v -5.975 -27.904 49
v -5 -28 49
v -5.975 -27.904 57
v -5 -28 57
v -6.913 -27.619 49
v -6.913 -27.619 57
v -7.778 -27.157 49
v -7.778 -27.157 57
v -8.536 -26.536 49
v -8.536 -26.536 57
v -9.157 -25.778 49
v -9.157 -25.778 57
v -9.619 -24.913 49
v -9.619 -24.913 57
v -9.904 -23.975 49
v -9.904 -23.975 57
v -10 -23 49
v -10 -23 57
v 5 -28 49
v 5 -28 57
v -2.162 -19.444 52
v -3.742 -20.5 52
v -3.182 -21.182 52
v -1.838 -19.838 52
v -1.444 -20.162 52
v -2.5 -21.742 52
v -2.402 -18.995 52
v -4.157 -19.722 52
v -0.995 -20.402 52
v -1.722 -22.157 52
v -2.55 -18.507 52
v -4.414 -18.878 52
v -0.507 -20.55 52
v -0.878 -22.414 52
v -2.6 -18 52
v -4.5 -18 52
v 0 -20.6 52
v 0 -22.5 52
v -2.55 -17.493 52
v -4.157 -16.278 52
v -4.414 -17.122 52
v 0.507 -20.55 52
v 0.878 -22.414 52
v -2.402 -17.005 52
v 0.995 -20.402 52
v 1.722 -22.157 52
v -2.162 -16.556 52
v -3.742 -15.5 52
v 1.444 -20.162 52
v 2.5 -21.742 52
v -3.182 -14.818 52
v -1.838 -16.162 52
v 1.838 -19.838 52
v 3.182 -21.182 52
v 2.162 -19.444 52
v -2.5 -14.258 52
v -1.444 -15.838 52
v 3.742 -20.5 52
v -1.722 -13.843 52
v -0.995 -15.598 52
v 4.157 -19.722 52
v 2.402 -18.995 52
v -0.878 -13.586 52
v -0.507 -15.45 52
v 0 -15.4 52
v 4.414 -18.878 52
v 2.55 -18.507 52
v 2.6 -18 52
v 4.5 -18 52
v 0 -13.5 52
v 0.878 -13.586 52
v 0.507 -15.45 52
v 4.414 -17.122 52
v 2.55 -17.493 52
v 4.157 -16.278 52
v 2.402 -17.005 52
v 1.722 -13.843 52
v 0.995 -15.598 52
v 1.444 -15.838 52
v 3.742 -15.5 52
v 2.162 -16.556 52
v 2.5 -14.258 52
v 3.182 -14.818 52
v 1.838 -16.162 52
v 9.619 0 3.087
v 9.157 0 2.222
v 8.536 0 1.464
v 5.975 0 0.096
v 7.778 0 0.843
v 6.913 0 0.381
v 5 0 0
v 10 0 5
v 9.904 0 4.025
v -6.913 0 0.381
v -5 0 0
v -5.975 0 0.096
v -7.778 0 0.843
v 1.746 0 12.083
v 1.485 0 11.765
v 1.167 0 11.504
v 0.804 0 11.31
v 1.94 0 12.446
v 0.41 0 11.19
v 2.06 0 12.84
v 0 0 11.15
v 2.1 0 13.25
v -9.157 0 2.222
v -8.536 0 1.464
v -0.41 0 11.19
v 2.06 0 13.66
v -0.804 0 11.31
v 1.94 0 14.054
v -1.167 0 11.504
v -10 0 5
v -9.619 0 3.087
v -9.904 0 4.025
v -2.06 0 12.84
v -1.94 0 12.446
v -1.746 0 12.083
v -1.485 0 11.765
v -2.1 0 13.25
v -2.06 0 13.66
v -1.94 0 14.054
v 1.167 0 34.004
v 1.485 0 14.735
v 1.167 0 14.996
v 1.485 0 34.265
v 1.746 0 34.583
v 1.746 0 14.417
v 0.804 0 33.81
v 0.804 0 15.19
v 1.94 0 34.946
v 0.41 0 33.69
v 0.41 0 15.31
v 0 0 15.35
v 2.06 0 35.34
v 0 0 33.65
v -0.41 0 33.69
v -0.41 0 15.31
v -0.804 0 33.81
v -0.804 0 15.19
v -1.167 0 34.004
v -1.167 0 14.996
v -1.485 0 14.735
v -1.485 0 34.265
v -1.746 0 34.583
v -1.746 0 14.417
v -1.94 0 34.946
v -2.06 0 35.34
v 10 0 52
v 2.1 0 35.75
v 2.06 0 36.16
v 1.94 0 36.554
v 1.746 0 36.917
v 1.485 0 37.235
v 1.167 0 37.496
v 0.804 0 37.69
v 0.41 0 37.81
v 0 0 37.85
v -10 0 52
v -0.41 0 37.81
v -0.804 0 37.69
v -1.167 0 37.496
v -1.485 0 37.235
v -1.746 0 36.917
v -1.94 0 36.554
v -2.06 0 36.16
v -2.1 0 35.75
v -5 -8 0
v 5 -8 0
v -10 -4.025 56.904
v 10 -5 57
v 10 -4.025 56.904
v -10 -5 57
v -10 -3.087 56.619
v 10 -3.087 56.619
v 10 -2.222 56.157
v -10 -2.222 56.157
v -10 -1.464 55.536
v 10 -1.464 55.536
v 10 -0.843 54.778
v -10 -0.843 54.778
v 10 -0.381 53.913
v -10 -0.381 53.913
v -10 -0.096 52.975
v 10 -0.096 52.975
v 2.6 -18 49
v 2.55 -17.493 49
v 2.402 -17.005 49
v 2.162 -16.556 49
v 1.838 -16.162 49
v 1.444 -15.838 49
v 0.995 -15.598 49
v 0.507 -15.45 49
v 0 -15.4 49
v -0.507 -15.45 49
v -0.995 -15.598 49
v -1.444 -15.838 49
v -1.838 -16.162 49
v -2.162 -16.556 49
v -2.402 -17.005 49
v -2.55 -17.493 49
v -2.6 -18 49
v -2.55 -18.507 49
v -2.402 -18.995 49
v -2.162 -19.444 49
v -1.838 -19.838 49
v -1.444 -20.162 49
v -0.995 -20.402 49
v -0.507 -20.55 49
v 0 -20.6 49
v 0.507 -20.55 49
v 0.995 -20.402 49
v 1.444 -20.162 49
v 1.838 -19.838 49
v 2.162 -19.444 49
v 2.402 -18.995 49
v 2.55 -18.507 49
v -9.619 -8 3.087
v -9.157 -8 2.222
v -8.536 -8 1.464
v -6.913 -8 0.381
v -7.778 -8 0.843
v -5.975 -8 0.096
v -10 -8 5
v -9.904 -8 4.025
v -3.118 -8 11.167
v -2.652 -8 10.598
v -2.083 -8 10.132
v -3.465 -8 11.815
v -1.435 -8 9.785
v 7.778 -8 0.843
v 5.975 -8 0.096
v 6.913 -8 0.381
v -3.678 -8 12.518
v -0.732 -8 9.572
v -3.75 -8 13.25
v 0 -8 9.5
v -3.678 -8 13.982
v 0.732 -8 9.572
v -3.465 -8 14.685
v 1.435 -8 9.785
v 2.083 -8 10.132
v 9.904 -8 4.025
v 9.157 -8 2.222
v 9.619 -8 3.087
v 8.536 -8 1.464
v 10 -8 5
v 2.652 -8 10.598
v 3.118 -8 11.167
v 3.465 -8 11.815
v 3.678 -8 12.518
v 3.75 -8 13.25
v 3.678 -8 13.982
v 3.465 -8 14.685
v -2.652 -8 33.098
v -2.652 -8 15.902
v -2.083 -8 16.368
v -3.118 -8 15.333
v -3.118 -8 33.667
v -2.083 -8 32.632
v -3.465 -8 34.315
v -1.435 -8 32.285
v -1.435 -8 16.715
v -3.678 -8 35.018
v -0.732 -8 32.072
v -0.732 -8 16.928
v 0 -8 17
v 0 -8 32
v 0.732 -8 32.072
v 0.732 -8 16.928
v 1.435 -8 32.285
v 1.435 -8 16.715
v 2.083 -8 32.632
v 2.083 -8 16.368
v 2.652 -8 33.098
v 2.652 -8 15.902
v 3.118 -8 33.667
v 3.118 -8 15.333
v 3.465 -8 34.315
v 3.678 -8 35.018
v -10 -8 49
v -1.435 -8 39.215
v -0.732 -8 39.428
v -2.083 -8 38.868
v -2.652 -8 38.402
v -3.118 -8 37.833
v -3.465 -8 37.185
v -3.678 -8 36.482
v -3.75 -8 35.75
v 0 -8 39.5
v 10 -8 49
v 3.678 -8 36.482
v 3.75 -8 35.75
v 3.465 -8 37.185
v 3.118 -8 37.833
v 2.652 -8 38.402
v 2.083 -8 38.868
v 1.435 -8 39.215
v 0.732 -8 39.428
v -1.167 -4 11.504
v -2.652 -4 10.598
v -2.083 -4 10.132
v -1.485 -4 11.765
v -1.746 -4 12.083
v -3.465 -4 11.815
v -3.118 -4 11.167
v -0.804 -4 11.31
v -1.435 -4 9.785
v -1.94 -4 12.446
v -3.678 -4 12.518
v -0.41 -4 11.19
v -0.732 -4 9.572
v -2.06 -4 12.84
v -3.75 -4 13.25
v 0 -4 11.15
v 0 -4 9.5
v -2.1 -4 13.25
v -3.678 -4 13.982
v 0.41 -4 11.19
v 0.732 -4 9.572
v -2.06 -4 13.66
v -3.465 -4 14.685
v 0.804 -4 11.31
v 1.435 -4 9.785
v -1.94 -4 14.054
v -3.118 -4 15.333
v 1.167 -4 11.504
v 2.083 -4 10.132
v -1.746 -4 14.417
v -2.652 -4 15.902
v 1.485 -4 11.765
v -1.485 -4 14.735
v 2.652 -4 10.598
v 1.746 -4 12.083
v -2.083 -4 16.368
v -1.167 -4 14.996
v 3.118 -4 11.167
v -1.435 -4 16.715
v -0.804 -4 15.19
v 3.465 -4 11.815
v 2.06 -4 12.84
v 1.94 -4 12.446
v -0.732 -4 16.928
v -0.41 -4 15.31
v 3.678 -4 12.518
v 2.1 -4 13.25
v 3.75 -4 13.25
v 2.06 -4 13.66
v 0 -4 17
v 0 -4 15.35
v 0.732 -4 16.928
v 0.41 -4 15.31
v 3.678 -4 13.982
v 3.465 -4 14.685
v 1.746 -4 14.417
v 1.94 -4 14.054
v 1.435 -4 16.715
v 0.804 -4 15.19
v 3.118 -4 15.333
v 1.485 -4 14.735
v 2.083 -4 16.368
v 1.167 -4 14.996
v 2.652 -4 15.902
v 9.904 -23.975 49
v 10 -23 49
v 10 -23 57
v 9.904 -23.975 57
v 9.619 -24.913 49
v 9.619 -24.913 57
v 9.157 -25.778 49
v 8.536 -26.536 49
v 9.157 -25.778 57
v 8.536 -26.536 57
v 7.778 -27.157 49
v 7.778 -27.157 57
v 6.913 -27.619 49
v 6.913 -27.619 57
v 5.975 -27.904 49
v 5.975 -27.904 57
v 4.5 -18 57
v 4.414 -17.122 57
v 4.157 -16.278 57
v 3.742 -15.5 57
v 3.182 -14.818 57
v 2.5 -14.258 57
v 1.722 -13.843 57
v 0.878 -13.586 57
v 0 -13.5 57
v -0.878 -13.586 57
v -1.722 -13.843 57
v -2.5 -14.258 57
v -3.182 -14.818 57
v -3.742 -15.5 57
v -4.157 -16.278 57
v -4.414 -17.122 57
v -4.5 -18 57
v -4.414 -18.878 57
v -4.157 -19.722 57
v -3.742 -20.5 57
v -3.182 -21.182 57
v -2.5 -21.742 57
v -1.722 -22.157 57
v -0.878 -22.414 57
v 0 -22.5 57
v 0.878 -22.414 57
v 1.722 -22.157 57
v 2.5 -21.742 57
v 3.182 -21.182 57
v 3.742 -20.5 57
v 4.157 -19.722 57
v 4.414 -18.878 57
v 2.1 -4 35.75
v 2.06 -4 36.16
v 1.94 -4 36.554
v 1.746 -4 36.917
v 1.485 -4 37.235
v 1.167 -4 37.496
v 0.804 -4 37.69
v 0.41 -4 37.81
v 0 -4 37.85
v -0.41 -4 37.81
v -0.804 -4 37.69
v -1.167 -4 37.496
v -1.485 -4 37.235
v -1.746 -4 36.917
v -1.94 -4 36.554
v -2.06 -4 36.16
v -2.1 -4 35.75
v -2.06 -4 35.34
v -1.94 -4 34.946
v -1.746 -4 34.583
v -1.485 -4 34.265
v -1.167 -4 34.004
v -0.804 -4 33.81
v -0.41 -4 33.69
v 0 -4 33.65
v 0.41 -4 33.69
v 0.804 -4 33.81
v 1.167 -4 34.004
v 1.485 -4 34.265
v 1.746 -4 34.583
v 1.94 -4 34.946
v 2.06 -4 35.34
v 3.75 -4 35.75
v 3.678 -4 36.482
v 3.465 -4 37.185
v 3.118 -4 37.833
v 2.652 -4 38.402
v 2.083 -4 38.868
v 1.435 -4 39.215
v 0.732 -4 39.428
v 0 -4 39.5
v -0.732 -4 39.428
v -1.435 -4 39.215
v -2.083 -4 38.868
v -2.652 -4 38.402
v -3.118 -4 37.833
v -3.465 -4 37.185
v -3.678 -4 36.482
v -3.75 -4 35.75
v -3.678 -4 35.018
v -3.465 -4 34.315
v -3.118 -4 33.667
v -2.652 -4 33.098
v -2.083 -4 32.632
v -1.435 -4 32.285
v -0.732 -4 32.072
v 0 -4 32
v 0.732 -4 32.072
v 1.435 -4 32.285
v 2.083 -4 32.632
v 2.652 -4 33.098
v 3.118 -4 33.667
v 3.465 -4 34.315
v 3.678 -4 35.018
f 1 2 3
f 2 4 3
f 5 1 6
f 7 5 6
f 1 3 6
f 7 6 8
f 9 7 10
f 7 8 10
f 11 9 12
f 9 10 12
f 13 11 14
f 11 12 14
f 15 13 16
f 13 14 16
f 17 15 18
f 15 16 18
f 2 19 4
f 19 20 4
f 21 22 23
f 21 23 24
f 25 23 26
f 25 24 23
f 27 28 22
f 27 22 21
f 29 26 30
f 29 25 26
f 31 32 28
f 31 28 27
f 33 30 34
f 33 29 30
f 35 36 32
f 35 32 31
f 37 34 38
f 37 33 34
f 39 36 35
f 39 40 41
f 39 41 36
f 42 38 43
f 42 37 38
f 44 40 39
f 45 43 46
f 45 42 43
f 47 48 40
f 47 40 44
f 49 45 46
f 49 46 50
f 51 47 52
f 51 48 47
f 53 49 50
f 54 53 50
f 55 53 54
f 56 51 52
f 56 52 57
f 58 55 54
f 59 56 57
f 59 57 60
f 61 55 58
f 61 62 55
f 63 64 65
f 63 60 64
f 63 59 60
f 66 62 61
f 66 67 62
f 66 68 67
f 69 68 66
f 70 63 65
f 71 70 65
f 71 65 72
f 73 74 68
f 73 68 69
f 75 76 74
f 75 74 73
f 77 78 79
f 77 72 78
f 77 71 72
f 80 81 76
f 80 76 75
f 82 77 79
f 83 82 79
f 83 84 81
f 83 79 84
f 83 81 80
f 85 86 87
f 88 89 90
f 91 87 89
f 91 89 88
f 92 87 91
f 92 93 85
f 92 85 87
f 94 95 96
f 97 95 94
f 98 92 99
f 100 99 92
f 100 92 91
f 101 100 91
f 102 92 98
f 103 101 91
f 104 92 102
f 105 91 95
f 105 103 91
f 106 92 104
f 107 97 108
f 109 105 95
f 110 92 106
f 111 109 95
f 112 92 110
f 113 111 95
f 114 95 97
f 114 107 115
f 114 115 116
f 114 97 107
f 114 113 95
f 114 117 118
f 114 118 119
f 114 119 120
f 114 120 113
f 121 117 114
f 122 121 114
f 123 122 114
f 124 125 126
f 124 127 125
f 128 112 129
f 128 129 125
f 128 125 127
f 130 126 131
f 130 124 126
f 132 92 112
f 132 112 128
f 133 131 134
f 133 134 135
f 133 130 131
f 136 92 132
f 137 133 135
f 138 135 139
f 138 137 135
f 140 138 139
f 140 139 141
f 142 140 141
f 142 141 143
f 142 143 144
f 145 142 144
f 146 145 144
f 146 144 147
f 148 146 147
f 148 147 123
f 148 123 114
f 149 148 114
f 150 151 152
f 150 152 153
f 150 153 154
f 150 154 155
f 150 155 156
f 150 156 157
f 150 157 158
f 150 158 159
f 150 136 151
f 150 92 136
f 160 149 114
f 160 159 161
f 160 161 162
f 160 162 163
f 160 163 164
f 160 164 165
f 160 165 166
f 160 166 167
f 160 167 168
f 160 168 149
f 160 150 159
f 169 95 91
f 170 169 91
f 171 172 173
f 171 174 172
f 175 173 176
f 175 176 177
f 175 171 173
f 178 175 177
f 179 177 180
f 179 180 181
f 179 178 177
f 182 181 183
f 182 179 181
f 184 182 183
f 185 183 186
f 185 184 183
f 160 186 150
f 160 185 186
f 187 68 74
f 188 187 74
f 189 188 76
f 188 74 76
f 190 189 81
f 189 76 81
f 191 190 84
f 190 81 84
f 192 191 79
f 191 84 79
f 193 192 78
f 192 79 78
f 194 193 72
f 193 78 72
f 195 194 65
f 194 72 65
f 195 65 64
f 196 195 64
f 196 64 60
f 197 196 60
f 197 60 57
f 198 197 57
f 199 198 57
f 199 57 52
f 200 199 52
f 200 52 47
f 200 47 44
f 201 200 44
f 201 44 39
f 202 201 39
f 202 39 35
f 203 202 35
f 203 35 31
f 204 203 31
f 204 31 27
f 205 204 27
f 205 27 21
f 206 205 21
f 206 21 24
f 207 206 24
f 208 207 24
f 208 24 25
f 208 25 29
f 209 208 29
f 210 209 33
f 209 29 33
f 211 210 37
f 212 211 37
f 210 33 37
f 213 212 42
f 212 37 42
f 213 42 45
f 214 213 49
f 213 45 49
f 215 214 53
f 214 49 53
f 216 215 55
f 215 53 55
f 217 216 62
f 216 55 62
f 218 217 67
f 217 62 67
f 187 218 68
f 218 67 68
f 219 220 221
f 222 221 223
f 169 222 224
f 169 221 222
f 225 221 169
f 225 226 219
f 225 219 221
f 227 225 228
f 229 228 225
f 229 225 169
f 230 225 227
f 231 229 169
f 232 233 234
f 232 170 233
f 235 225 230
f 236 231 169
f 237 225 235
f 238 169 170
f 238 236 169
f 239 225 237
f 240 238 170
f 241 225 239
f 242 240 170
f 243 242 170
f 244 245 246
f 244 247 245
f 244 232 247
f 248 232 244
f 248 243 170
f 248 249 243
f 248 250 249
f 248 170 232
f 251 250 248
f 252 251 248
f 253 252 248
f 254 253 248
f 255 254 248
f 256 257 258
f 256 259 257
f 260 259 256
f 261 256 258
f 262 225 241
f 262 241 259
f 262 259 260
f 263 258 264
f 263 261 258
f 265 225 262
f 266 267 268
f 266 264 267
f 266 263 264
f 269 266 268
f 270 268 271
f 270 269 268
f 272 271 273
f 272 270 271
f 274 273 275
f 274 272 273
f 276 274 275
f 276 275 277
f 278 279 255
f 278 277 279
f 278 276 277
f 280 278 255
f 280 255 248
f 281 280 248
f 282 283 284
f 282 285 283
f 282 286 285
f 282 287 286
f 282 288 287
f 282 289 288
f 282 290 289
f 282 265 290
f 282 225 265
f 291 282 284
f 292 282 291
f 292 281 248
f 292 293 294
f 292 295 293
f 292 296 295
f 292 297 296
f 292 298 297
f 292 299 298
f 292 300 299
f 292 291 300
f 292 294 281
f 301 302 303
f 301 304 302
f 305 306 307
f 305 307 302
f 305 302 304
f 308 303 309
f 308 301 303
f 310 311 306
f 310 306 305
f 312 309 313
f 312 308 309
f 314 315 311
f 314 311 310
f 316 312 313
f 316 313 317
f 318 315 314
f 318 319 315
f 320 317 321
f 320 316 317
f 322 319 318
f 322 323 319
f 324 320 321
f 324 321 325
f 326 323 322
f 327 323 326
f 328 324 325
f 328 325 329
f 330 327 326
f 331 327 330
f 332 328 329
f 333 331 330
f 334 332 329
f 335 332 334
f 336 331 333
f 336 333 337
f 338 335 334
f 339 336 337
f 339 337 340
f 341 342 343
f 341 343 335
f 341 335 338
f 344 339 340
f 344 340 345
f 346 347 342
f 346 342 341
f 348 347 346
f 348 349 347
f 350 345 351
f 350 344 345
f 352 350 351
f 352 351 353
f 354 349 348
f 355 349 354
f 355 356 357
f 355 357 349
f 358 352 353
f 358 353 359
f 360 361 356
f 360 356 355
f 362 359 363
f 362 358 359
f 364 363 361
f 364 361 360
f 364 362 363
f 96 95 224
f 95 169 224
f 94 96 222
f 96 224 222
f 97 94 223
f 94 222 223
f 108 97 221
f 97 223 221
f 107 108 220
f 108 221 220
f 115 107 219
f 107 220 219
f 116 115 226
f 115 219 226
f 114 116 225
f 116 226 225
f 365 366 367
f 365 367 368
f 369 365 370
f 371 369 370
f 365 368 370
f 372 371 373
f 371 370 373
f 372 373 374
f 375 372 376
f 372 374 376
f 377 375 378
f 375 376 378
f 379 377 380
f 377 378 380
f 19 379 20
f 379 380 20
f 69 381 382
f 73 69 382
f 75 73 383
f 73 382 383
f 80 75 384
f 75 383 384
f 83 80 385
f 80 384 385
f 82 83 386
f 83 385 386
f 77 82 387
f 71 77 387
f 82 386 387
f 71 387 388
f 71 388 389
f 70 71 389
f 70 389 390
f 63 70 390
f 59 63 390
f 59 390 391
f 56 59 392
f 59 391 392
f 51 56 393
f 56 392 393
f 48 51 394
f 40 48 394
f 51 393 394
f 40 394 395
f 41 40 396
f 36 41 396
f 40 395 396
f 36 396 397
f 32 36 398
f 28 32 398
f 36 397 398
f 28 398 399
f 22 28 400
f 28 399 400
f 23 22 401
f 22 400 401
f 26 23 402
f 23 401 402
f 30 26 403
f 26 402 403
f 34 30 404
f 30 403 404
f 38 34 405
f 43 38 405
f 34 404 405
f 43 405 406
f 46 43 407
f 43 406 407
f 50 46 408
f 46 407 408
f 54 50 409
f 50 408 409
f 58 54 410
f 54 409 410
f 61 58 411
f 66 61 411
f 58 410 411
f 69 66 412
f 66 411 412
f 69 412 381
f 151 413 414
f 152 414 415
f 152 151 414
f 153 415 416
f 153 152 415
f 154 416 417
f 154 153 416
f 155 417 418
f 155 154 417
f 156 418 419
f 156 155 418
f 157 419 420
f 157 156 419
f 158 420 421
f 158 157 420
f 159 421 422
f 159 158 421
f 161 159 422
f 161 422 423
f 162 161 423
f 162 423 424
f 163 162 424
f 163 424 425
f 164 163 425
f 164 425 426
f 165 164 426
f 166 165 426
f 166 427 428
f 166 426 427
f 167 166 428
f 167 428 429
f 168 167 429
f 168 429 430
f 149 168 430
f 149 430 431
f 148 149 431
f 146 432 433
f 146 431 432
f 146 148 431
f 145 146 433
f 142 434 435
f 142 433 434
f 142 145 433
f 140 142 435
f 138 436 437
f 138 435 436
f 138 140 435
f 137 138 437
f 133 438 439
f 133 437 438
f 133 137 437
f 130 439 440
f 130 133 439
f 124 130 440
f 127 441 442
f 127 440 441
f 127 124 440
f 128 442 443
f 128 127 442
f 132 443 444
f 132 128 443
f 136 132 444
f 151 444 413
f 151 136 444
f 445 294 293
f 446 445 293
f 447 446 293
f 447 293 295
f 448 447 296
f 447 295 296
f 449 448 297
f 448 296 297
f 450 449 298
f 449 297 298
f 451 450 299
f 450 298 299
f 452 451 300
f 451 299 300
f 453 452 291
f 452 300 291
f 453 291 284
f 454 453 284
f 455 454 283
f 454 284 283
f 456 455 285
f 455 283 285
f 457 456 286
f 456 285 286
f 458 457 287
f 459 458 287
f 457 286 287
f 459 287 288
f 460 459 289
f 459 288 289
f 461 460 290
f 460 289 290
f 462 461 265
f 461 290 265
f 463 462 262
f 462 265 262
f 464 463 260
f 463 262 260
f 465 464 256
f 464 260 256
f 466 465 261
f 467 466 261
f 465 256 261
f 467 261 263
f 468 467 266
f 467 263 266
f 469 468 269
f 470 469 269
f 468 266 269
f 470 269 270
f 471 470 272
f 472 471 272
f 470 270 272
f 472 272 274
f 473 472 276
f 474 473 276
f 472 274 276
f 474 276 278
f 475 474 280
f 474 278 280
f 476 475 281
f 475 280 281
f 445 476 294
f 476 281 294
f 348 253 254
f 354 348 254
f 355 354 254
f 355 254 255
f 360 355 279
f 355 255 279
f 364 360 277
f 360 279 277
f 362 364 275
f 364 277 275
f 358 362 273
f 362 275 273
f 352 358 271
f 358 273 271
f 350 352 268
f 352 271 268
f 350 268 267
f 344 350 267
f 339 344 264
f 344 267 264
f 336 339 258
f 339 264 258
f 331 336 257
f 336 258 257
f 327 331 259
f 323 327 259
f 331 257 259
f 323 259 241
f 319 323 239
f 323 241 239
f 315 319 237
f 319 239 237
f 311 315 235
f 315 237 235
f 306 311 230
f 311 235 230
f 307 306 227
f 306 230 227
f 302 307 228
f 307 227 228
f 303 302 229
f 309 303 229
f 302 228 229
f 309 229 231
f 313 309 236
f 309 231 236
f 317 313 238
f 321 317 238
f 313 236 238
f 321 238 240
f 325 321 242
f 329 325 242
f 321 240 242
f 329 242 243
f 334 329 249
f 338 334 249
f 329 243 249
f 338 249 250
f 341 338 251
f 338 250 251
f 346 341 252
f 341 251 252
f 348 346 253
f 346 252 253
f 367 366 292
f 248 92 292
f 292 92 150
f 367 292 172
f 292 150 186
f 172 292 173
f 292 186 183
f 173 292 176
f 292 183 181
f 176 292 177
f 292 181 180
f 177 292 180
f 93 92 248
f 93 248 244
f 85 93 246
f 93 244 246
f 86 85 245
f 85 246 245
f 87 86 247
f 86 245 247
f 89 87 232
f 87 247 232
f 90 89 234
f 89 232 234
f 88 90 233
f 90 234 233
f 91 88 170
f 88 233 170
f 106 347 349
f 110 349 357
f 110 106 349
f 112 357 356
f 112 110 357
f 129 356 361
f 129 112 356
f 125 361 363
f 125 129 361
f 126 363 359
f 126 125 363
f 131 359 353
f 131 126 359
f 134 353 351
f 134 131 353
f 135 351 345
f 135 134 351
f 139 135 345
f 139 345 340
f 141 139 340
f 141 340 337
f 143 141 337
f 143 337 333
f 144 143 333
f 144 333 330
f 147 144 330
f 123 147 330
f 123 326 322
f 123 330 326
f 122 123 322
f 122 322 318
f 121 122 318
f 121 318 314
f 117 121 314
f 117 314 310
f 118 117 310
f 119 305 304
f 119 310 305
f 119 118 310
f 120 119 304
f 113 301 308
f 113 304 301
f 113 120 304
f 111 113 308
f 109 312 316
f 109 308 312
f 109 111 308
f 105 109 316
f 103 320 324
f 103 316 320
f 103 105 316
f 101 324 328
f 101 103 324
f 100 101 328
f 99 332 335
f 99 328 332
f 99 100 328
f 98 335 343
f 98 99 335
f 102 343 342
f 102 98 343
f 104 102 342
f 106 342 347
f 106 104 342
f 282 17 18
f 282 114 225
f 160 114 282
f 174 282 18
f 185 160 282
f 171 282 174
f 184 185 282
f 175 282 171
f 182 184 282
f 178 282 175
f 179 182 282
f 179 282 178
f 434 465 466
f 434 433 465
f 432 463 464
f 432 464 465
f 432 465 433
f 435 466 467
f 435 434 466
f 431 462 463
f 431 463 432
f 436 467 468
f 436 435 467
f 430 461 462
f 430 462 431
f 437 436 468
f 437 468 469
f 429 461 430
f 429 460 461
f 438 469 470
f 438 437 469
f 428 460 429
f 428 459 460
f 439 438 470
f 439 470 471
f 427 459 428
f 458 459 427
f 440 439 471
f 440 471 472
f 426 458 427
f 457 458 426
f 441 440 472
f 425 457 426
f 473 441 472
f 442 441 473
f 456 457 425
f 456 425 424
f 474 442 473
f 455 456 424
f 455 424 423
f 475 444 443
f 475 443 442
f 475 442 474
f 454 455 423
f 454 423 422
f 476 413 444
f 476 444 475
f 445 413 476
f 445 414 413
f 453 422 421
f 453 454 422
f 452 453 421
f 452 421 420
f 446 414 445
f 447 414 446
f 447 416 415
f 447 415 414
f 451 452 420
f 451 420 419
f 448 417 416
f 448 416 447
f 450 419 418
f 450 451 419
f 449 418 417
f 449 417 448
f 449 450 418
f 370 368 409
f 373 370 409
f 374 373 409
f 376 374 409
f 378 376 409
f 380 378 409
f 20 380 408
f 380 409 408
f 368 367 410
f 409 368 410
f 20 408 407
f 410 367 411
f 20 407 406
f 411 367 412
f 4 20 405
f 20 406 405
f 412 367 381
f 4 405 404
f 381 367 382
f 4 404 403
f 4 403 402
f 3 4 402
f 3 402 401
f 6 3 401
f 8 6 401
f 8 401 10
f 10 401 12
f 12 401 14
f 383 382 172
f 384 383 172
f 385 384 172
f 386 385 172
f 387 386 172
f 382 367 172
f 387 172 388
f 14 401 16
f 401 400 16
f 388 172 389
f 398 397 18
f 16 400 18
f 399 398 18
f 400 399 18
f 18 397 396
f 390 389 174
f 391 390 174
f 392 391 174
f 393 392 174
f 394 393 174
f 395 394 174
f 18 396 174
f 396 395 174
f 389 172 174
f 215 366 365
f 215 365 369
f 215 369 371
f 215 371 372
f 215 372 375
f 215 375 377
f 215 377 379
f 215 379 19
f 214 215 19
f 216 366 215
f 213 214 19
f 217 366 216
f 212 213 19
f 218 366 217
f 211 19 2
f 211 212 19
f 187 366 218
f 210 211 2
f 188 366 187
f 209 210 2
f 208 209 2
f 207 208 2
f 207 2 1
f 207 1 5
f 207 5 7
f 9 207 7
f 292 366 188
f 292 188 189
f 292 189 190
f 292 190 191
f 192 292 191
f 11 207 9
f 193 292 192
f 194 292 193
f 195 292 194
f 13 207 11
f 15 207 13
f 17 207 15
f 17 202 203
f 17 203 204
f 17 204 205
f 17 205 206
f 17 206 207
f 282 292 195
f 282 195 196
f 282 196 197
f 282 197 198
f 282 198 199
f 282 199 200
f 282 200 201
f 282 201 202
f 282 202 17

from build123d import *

# Parameters (mm, degrees)
F0_W     = 20
F0_H     = 49
F0_R     = 2.1
F1_DEPTH = 8
F2_R     = 3.75
F3_DEPTH = 4
F4_W     = 20
F4_H     = 8
F5_DEPTH = 28
F6_R     = 2.6
F7_DEPTH = 57.001
F8_R     = 4.5
F9_DEPTH = 5
F10_R    = 5


with BuildPart() as f1:
    # F0 (on Front) → F1 (new body)
    with BuildSketch(Plane.XZ):
        with Locations((0, 24.5)):
            Rectangle(F0_W, F0_H)
        with Locations((0, 13.25)):
            Circle(F0_R, mode=Mode.SUBTRACT)
        with Locations((0, 35.75)):
            Circle(F0_R, mode=Mode.SUBTRACT)
    extrude(amount=F1_DEPTH)

    # F2 (on face) → F3 (cut)
    with BuildSketch(Plane.XZ.offset(8)):
        with Locations((0, 35.75)):
            Circle(F2_R)
        with Locations((0, 13.25)):
            Circle(F2_R)
    extrude(amount=-F3_DEPTH, mode=Mode.SUBTRACT)

    # F4 (on face) → F5 (join)
    with BuildSketch(Plane(origin=(0, 0, 0), x_dir=(-1, 0, 0), z_dir=(0, 1, 0))):
        with Locations((0, 53)):
            Rectangle(F4_W, F4_H)
    extrude(amount=-F5_DEPTH)

    # F6 (on face) → F7 (cut, through all)
    with BuildSketch(Plane.XY.offset(57)):
        with Locations((0, -18)):
            Circle(F6_R)
    extrude(amount=-F7_DEPTH, mode=Mode.SUBTRACT)

    # F8 (on face) → F9 (cut)
    with BuildSketch(Plane.XY.offset(57)):
        with Locations((0, -18)):
            Circle(F8_R)
    extrude(amount=-F9_DEPTH, mode=Mode.SUBTRACT)

    # F10
    f10_edges = [f1.edges().sort_by_distance(p)[0] for p in [
        (10, -28, 53),
        (-10, -28, 53),
        (0, 0, 57),
        (10, -4, 0),
        (-10, -4, 0),
    ]]
    fillet(f10_edges, radius=F10_R)


solid = f1.part
